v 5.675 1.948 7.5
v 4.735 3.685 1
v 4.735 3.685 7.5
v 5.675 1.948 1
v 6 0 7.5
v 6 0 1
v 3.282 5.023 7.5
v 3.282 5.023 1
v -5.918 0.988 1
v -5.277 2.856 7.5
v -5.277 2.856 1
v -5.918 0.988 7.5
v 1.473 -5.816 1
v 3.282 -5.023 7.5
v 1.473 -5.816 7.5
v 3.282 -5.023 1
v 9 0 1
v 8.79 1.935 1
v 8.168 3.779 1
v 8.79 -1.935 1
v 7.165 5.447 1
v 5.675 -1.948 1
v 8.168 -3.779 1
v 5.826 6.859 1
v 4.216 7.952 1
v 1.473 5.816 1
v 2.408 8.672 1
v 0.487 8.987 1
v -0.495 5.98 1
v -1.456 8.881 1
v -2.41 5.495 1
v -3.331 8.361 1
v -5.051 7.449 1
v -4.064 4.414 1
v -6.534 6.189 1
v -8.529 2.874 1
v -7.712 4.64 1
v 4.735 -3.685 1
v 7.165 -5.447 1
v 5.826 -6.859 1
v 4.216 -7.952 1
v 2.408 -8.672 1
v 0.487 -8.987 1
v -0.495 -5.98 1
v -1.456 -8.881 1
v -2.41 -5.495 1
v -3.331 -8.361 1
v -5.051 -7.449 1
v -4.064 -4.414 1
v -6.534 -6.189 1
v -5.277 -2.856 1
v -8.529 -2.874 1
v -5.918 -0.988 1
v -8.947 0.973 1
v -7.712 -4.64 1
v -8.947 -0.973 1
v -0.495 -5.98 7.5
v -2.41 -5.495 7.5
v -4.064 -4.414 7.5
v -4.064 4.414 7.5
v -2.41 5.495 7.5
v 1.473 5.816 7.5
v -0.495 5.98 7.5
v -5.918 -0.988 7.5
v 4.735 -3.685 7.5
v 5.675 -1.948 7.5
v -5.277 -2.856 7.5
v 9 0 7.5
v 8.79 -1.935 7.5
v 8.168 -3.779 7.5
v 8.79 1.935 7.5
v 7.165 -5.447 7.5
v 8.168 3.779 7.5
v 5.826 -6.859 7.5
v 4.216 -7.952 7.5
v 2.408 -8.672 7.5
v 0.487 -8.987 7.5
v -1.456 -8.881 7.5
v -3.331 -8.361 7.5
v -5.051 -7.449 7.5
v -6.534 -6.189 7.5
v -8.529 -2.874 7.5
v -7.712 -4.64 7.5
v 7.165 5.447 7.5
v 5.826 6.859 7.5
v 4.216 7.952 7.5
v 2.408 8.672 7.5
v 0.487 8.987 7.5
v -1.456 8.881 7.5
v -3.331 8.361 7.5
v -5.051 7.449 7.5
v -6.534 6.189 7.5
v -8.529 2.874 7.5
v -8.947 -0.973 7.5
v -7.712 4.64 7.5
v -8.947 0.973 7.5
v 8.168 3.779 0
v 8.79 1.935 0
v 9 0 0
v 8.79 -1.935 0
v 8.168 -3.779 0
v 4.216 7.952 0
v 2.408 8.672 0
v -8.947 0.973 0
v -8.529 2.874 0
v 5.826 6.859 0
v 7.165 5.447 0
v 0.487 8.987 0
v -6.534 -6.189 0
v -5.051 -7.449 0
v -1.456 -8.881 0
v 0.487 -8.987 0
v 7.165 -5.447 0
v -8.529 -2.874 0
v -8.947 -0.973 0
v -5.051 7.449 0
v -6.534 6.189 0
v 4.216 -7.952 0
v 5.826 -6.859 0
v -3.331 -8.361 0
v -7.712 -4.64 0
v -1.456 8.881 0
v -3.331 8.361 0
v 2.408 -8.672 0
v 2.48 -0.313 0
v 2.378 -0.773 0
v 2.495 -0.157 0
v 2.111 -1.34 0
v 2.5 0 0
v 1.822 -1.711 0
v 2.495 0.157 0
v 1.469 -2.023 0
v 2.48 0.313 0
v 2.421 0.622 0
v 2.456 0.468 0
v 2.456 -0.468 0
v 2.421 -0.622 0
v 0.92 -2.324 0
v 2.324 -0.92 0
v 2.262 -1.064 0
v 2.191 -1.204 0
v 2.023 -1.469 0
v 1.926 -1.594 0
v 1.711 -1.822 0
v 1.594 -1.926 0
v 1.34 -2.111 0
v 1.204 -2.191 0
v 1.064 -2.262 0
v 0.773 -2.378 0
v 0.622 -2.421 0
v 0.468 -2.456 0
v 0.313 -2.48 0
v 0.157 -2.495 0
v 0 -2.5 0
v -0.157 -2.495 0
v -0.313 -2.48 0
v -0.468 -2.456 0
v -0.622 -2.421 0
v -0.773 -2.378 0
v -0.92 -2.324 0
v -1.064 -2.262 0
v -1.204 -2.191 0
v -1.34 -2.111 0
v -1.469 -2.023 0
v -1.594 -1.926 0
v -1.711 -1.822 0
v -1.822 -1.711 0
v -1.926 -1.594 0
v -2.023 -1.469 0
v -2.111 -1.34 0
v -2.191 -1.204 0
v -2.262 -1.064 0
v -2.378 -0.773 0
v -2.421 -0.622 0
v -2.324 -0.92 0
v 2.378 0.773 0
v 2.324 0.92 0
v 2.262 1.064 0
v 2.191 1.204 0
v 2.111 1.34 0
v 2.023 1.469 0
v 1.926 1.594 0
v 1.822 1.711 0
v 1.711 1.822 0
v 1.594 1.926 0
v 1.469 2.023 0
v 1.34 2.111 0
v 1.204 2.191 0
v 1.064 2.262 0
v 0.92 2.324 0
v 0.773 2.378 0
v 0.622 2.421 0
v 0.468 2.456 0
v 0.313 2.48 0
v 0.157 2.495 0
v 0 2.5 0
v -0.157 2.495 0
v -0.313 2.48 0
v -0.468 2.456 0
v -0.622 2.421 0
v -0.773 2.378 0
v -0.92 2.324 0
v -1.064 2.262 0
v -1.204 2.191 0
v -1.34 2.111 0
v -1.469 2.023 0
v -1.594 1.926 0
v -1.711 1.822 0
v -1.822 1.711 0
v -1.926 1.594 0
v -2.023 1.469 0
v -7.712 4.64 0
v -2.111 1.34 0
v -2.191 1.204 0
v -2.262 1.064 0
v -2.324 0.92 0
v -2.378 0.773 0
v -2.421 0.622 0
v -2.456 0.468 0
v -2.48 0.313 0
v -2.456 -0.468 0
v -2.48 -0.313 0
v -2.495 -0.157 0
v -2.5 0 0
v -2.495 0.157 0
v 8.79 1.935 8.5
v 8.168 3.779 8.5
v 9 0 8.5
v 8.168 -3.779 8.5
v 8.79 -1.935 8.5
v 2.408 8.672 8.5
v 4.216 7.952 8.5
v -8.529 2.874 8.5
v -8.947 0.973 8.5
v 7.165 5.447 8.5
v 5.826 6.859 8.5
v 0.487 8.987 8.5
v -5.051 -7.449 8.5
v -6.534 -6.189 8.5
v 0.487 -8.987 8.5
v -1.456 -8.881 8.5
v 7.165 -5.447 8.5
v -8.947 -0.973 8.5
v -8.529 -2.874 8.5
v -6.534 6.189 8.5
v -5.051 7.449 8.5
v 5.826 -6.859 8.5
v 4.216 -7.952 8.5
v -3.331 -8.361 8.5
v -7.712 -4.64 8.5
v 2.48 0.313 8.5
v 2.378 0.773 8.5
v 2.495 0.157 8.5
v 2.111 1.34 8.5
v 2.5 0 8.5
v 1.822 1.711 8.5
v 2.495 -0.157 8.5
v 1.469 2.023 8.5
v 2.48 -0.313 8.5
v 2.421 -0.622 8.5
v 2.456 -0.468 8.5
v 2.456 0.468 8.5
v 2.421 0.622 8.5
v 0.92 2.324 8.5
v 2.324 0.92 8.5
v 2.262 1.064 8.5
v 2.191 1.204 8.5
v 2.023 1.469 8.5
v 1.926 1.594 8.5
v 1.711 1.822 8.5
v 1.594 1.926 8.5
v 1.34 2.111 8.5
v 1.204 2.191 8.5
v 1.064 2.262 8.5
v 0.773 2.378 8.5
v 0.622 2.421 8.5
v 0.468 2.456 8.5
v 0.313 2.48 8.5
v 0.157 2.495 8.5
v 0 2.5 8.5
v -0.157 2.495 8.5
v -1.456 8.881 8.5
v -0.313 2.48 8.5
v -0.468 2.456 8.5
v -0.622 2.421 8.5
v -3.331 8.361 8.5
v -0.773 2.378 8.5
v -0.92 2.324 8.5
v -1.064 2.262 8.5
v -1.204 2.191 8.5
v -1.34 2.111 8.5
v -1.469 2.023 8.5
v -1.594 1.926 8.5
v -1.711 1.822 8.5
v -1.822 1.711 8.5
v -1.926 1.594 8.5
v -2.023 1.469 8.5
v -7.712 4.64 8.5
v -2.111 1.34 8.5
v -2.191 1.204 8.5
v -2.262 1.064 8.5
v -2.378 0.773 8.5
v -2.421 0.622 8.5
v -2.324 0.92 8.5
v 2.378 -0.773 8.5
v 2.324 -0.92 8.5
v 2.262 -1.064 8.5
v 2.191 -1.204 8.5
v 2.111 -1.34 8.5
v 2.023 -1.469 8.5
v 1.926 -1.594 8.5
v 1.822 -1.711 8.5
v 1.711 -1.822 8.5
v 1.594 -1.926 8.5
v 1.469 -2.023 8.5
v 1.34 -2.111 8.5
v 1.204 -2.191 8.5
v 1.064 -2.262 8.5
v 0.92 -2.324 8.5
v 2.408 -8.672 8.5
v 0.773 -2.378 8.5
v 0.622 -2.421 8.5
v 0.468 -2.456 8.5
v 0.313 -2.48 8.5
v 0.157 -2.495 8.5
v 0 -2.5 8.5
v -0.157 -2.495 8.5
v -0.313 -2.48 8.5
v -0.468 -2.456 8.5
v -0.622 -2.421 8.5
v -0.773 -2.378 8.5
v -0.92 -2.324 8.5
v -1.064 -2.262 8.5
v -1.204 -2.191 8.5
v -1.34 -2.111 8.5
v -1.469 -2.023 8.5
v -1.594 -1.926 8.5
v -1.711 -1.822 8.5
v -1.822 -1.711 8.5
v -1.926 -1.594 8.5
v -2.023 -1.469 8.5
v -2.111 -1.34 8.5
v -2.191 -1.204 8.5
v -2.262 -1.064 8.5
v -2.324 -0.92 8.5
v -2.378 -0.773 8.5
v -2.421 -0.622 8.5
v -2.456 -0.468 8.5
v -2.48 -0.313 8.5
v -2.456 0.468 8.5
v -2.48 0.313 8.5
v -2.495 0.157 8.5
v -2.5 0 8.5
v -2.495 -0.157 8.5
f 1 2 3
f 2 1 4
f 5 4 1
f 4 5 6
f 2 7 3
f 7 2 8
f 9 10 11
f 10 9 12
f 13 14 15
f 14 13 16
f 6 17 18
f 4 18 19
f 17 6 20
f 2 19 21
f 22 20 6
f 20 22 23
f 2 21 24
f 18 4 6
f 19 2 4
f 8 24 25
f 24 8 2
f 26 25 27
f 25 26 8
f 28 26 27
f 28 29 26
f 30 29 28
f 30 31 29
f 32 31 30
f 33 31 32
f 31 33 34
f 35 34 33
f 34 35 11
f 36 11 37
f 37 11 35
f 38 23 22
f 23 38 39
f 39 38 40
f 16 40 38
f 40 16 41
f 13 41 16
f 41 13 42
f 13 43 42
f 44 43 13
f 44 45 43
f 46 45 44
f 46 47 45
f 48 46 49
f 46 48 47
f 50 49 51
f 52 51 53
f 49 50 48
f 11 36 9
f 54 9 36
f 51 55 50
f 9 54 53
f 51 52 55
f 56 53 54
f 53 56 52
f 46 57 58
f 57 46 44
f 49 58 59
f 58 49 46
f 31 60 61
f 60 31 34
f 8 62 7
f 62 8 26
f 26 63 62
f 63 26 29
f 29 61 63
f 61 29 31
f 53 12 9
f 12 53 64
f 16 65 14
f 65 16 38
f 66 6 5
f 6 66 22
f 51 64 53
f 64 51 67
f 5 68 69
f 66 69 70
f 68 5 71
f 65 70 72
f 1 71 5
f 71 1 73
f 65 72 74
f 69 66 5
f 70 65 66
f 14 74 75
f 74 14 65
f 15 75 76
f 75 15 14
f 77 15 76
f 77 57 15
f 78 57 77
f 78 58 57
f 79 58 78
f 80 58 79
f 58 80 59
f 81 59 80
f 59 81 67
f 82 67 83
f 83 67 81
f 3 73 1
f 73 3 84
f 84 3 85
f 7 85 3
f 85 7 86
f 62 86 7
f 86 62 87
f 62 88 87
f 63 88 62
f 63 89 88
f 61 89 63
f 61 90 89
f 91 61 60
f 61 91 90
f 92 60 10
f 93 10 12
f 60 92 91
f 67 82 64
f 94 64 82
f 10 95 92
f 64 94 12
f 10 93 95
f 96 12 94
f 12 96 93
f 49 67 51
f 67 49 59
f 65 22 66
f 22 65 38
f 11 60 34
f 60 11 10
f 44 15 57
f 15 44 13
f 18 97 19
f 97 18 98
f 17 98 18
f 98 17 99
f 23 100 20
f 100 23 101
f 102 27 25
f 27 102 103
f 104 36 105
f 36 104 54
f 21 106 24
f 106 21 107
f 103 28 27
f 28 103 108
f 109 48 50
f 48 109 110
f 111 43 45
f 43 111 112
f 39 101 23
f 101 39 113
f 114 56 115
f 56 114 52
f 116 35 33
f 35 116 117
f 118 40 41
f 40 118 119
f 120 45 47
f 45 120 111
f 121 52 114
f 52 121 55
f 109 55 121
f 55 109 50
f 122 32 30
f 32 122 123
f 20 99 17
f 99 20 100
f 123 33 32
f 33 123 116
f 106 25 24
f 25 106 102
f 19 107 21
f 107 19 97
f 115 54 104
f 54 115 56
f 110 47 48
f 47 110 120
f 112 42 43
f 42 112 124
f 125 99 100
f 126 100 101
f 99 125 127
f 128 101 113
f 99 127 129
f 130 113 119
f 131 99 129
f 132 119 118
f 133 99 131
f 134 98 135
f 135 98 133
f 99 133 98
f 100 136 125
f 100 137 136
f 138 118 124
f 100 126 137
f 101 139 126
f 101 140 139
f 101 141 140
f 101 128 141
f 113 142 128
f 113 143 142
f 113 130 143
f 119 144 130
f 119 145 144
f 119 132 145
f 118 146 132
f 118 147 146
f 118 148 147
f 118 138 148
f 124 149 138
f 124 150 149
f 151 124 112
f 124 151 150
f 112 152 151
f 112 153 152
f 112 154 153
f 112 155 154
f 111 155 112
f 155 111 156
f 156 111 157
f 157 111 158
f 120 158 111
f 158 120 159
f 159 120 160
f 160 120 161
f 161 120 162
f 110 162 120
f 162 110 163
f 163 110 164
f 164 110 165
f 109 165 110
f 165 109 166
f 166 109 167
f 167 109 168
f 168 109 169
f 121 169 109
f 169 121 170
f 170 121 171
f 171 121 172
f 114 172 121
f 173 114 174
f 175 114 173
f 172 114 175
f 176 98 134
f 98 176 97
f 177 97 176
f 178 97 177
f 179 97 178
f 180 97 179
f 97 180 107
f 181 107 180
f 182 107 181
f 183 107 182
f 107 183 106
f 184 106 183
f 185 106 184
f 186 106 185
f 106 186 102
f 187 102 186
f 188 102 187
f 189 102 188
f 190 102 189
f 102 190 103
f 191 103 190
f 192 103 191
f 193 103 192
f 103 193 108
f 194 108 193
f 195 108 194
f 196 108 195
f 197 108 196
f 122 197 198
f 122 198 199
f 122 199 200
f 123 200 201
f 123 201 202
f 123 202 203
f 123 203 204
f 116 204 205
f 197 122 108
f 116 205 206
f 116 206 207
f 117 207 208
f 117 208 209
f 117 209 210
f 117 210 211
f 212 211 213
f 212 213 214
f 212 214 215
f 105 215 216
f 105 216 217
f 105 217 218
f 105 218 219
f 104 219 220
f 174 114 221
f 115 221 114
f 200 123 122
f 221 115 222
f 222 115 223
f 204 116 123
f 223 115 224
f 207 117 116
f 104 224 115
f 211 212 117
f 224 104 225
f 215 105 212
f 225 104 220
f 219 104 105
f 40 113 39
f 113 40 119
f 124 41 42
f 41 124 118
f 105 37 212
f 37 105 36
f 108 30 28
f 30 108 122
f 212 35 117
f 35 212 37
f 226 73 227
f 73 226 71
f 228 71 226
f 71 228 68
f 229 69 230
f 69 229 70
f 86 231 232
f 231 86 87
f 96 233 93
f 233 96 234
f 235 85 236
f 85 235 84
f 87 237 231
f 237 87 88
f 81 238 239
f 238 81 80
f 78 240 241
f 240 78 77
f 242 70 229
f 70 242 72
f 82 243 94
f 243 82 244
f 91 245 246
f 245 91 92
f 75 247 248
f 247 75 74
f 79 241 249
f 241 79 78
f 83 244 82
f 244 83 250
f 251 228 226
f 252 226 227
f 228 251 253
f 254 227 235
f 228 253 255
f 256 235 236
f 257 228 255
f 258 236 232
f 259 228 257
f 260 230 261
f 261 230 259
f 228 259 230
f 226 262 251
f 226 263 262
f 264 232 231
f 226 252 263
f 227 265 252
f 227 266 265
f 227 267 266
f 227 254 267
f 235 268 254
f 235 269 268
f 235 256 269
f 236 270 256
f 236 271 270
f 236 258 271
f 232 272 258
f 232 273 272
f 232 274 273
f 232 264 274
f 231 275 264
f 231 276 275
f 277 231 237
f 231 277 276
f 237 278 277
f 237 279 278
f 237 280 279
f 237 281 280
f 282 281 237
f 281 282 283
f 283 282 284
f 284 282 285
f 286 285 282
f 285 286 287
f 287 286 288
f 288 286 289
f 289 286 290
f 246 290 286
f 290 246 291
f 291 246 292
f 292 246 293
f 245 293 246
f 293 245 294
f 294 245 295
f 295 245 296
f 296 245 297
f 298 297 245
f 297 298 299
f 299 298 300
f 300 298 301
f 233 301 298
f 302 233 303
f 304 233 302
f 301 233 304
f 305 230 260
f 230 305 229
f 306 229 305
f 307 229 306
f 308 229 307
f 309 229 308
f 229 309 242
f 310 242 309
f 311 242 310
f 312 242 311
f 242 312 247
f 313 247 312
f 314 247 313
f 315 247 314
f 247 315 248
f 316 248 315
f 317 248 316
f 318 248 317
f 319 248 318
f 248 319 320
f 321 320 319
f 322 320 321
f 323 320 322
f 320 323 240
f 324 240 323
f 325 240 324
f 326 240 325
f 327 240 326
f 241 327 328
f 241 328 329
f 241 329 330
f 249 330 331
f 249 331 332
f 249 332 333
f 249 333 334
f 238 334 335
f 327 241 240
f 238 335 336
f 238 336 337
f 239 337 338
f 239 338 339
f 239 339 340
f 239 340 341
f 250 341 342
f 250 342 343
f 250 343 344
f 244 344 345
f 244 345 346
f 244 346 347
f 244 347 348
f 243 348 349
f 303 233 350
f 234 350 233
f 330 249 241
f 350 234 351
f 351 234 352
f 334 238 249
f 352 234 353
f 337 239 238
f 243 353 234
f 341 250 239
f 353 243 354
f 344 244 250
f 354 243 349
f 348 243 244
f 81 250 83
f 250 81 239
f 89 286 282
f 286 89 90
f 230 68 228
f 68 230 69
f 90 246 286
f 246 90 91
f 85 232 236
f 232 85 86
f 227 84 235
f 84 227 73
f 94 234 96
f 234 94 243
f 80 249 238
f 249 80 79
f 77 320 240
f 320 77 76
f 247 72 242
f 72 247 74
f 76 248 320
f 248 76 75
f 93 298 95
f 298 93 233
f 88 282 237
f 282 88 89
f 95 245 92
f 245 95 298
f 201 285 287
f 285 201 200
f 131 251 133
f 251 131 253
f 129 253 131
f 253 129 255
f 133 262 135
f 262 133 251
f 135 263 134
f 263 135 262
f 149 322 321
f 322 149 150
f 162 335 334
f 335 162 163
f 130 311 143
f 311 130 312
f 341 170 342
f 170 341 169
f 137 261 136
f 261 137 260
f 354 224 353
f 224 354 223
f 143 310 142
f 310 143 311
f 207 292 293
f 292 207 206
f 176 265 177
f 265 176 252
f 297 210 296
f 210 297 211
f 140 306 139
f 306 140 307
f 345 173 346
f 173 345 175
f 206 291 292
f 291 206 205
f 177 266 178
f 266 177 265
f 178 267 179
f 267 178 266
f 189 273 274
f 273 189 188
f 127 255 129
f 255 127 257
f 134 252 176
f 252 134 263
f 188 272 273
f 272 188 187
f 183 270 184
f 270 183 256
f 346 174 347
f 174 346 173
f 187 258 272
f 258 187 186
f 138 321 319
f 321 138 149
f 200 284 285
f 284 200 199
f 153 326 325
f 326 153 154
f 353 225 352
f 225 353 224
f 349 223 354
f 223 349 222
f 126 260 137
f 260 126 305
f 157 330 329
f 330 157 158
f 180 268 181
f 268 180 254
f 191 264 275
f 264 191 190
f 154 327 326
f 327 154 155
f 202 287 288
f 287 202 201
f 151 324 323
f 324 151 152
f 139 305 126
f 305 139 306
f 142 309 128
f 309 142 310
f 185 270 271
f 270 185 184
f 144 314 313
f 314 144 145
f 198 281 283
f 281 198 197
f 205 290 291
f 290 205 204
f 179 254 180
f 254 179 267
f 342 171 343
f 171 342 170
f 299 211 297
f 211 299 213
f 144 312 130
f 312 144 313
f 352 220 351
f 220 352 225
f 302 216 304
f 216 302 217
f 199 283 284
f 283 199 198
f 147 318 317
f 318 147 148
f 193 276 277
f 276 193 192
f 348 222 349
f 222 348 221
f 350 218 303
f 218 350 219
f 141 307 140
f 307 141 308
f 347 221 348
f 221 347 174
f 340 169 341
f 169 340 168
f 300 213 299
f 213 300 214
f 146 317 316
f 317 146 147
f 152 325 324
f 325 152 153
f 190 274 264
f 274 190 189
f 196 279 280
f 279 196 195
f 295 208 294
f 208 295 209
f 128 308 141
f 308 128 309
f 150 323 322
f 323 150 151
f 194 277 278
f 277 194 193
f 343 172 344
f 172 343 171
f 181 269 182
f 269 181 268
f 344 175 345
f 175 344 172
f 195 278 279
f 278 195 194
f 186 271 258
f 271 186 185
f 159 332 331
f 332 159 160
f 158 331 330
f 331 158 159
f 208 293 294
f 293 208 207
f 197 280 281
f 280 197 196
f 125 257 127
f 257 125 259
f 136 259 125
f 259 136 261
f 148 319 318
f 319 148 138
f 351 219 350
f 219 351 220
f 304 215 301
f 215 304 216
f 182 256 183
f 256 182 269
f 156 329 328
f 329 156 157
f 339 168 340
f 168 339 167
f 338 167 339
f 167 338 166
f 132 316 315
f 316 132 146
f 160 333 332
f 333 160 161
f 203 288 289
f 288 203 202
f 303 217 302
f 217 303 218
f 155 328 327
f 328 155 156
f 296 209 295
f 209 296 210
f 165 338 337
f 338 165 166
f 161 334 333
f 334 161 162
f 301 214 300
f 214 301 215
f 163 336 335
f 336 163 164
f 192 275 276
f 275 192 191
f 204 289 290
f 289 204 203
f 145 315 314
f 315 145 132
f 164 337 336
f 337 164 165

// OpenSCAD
// file: vars.scad
/* Makefile needs */
PART = "none";
IMAGE = "none";

/* colors */
part_color = "skyblue";

/* frame */
height = 690;
width = 500;
depth = 500;

frame_size = 20;
frame_half = frame_size / 2;

glass_height = 3;
glass_width = 400;
glass_depth = 400;

rail_diam = 10;
z_rail_width = 60;
z_carriage_width = z_rail_width + frame_size;

// Sources for Metric fastener dimensions
// http://www.carbidedepot.com/formulas-tap-metric.htm
// http://www.roymech.co.uk/Useful_Tables/Screws/cap_screws.htm
// https://www.fairburyfastener.com/xdims_metric_nuts.htm

// M5
M5_bolt_diam = 5;
M5_bolt_hole = 5.5;
M5_bolt_head_diam = 9;
M5_bolt_head_height = 4;
M5_nut_height = 4;
M5_nut_width = 7.9;
M5_nut_diam = 9;

// M4
M4_bolt_diam = 4;
M4_bolt_hole = 4.5;
M4_nut_height = 3.5;
M4_nut_width = 6.9;
M4_nut_diam = 8;


//608zz
608zz_height=7;
608zz_od=22;
608zz_id=8;
608zz_race=11;



// Height adjustment
pivot_diam=12;
height_bolt_diam=M4_bolt_diam;
// main file
/*
 *
 * Copyright 2019 Tim Schaller
 * All rights reserved
 * Released under the GPL3
 * No claims are made as to the fitness and/or corectness of
 * this work. Use at your own risk. If you create useless things,
 * or if the parts fail it is on you NOT ME. As far as I know
 * this might make your printer burst into flames or print
 * little pink bunnies. You call. };->
 *
 *
 *
 * This is just a parts library for G2 belt assessories.
 * You know pullys and things.
*/

include <vars.scad>;

PART = "g2_smooth_pulley";

if (PART == "g2_smooth_pulley") {
    g2_smooth_pulley();
}


module g2_smooth_pulley(h=6.5) {
  difference() {
    union() {
      translate([0, 0, (h/2)+1]) cylinder(h=h, d=12, center=true, $fm=100);
      translate([0, 0, 0.5]) cylinder(h=1, d=18, center=true, $fm=100);
      translate([0, 0, h+1.5]) cylinder(h=1, d=18, center=true, $fm=100);
    }
    translate([0, 0, (h/2)+1])
    cylinder(h=h+3, d=5, center=true, $fn=100);
  }
}
